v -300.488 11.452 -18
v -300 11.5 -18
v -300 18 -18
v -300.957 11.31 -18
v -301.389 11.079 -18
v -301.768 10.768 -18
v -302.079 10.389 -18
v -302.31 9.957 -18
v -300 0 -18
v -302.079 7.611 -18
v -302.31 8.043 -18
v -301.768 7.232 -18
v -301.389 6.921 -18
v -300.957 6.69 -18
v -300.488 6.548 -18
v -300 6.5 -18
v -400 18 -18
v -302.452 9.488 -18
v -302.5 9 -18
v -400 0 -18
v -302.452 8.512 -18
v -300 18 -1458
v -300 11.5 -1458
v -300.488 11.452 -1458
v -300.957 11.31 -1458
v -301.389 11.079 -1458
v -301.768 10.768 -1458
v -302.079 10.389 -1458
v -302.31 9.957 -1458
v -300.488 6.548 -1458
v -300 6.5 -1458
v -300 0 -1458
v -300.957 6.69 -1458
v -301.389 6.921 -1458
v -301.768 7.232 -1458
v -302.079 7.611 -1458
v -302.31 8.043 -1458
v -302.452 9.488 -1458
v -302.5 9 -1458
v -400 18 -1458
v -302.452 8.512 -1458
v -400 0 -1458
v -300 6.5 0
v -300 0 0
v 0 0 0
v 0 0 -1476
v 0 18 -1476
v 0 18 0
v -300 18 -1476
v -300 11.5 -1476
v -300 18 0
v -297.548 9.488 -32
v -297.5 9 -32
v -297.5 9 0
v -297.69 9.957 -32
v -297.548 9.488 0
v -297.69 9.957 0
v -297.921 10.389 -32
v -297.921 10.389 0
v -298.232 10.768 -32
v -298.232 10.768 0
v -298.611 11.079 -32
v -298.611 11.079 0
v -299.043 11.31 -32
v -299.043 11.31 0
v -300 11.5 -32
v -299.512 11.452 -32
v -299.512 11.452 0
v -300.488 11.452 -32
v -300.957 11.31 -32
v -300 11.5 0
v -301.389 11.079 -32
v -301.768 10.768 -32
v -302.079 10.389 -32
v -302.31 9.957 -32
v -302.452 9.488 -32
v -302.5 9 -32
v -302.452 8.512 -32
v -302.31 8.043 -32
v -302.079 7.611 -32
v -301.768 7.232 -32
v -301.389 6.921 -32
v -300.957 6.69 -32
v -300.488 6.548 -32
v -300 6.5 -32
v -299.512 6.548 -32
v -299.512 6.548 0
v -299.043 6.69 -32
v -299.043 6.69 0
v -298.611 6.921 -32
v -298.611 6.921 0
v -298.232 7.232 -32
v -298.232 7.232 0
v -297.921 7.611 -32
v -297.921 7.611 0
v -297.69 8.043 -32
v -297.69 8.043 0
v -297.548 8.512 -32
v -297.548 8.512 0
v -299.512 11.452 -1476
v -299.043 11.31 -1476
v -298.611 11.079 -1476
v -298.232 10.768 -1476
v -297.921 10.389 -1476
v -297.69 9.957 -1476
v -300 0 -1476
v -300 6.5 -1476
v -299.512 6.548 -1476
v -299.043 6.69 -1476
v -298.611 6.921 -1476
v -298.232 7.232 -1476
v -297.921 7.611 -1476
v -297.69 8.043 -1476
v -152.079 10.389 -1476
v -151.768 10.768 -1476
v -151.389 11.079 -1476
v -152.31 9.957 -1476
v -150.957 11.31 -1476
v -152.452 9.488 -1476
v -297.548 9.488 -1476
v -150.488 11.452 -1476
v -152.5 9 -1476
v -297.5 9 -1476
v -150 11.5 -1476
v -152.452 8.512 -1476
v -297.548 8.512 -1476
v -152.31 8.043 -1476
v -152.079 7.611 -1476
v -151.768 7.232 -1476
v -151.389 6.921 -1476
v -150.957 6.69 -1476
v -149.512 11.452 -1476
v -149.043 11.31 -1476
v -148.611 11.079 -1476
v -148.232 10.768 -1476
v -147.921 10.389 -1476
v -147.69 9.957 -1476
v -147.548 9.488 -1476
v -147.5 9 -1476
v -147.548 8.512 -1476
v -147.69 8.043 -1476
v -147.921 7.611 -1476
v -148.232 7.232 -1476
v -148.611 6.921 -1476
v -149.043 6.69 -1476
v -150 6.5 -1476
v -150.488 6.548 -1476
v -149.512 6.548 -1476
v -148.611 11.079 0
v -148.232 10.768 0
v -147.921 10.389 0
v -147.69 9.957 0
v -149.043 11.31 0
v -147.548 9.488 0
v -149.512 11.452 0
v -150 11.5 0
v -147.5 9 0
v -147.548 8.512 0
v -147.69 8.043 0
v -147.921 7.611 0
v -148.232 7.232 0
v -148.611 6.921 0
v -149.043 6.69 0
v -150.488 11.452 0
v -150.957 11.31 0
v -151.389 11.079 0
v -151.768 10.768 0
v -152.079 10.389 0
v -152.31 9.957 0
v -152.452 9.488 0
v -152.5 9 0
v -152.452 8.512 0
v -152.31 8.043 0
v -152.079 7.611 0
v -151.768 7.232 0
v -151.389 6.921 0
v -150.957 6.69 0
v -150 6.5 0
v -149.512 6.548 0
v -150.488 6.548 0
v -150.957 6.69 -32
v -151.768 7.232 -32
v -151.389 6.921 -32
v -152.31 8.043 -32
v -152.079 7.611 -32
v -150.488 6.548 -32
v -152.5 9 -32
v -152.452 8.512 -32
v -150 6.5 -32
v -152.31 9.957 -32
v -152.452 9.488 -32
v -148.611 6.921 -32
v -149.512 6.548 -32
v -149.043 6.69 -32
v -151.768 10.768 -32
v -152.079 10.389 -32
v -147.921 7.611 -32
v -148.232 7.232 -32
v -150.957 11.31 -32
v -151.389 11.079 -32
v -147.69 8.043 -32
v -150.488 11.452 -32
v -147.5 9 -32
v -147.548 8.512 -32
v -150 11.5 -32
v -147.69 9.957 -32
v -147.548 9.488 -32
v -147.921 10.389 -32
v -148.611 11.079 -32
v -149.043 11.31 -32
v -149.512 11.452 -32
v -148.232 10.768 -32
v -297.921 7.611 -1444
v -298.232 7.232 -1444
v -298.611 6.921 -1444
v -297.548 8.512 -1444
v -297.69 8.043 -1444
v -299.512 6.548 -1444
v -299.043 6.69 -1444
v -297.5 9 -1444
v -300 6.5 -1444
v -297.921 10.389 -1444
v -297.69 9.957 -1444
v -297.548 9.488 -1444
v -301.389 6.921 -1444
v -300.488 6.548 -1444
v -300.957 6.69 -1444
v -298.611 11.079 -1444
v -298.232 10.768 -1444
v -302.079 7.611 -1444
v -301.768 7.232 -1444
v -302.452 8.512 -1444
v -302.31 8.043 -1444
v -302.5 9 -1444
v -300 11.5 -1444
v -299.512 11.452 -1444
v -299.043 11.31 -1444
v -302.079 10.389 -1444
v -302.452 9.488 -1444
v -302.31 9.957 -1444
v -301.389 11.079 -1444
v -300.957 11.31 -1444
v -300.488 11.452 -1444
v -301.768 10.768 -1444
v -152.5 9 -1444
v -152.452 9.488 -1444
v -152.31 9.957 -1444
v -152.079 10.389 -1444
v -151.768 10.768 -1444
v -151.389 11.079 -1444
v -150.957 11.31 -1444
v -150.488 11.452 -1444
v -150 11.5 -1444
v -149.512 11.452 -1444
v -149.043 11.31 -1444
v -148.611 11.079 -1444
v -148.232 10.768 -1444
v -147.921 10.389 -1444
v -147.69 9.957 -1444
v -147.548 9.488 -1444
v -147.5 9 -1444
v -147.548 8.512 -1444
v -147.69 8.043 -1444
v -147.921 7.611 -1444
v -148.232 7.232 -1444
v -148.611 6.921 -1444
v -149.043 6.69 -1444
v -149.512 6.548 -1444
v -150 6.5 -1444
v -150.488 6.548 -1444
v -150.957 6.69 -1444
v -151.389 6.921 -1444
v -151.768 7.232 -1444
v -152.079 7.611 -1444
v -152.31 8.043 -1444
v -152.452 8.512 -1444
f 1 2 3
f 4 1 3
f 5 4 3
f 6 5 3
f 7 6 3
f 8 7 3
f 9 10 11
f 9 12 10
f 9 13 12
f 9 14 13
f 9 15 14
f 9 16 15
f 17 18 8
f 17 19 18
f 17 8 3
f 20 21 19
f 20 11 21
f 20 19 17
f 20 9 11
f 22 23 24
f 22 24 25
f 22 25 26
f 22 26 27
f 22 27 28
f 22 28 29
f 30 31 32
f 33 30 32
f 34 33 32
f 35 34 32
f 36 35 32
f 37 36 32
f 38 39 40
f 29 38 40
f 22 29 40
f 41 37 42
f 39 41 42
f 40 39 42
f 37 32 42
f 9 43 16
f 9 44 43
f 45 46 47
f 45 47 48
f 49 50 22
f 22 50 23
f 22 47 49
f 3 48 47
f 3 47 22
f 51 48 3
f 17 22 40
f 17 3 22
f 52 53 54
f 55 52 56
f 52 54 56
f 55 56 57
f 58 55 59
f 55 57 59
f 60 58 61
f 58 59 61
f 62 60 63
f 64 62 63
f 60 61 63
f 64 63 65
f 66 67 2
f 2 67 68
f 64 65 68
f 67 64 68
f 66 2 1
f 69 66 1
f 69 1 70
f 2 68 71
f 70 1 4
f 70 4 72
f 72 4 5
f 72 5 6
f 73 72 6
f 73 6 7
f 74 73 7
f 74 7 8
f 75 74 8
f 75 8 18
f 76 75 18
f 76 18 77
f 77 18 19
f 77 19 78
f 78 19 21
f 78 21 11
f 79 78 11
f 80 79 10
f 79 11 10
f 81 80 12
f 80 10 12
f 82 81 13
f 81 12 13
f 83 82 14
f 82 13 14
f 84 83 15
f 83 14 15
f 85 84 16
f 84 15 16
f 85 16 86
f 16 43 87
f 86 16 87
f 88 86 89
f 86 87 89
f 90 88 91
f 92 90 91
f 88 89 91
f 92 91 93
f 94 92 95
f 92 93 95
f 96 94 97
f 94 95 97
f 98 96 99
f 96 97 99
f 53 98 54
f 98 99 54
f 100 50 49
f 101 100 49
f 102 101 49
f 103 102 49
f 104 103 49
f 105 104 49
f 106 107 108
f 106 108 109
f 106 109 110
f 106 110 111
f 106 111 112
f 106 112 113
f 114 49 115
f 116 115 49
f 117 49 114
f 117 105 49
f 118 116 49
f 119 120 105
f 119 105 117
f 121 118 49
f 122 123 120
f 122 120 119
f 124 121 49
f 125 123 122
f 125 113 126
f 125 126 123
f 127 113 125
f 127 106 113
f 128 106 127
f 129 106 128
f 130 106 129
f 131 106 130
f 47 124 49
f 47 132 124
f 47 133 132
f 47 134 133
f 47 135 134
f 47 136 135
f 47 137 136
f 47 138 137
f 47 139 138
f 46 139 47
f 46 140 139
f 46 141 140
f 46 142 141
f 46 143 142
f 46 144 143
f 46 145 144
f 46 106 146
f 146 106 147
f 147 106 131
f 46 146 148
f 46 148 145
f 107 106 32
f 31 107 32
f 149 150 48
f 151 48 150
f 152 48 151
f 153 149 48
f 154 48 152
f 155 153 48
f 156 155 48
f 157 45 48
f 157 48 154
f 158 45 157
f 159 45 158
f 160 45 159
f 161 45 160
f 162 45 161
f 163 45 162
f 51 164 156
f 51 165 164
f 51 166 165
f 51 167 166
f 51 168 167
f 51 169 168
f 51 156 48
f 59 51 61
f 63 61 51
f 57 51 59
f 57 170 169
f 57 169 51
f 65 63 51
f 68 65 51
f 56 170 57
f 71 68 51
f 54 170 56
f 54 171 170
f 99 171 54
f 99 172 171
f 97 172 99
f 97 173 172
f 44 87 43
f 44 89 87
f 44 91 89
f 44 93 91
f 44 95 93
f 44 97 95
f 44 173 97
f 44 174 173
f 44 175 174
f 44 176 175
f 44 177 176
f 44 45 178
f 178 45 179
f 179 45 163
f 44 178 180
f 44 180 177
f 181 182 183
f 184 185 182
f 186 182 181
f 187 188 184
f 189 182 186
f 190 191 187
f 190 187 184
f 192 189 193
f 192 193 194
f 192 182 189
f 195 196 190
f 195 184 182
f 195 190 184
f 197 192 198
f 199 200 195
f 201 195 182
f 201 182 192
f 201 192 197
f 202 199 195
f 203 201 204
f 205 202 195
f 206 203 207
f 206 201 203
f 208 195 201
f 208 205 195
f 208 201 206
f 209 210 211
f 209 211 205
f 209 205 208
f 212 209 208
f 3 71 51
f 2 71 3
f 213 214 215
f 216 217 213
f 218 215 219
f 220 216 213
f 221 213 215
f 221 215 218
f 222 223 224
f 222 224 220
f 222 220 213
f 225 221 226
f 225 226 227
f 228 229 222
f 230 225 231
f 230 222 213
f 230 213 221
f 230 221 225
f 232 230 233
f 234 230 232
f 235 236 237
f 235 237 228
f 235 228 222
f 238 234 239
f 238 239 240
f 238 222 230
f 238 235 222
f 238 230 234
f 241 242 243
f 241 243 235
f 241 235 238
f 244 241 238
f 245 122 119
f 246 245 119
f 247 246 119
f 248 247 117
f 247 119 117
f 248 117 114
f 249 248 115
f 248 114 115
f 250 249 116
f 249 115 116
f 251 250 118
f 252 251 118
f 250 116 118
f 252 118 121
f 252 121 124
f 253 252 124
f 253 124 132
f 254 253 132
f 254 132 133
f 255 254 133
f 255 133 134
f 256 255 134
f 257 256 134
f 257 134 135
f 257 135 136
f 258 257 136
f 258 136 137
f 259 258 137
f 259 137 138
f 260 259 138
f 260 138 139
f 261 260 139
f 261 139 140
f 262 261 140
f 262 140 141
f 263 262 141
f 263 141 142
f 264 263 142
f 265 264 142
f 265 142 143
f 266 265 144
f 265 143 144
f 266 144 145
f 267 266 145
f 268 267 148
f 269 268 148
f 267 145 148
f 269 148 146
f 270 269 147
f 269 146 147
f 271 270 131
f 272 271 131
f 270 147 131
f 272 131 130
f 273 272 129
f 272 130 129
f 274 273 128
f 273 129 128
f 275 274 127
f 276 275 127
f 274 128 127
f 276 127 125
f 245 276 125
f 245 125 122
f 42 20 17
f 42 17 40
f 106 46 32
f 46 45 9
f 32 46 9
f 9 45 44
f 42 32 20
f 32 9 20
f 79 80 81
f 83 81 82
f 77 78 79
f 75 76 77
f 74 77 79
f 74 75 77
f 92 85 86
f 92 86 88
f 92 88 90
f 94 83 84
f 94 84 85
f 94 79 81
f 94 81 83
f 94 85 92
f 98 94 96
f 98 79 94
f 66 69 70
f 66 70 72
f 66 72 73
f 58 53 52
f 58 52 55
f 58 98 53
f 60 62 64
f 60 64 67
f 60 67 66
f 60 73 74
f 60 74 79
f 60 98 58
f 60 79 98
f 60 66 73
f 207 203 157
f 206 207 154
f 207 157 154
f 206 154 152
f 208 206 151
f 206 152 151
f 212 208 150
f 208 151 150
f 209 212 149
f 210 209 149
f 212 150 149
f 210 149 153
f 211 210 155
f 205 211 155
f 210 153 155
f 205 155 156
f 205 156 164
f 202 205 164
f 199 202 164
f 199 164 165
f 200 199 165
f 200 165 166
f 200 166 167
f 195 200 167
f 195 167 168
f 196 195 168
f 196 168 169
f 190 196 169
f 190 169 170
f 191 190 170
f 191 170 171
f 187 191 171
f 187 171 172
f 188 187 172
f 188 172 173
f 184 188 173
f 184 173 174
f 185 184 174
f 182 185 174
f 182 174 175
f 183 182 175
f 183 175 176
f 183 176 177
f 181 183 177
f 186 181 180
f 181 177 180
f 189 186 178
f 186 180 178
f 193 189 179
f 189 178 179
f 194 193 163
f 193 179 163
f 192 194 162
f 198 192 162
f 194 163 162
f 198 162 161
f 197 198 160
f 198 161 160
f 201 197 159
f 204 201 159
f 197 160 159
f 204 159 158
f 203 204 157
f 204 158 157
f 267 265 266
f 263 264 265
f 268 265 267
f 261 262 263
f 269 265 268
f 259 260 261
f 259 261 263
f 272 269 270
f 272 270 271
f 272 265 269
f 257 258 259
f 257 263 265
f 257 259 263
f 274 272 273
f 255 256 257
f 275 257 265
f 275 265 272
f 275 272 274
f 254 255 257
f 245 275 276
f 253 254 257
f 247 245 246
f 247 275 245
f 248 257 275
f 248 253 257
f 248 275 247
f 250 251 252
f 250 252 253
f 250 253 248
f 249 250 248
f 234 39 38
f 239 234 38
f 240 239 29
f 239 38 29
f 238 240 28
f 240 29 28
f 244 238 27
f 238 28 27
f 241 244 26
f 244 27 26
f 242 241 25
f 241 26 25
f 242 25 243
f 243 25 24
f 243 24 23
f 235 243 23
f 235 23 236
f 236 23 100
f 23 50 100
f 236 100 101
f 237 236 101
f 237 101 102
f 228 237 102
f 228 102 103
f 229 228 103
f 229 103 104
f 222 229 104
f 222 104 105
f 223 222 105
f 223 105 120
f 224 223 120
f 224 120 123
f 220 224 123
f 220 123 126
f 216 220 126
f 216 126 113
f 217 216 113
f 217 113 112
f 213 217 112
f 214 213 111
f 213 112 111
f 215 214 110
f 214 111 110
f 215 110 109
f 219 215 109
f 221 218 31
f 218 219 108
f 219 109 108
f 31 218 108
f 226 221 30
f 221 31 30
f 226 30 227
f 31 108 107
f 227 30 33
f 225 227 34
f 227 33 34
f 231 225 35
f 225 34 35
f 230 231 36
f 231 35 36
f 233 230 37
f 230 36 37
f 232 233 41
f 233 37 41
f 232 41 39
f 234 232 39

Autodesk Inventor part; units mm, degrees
ref_plane "YZ Plane" through (0, 0, 0) normal (1, 0, 0) x (0, 1, 0)
ref_plane "XZ Plane" through (0, 0, 0) normal (0, 1, 0) x (-1, 0, 0)
ref_plane "XY Plane" through (0, 0, 0) normal (0, 0, 1) x (1, 0, 0)
sketch "Sketch1" plane through (0, 0, 0) normal (0, 1, 0) x (-1, 0, 0)
  line L0 (0, 0) -> (400, 0)
  line L1 (400, 0) -> (400, -1476)
  line L2 (400, -1476) -> (0, -1476)
  line L3 (0, -1476) -> (0, 0)
  line L4 (400, -1476) -> (418, -1476)
  line L5 (400, -1476) -> (300, -1476)
  line L6 (300, -1476) -> (300, -1458)
  line L7 (300, -1458) -> (400, -1458)
  line L8 (400, -1458) -> (400, -1476)
  line L9 (400, 0) -> (300, 0)
  line L10 (300, 0) -> (300, -18)
  line L11 (300, -18) -> (400, -18)
  line L12 (400, -18) -> (400, 0)
  dimension "d0" = 400
  dimension "d1" = 1476
  dimension "d4" = 100
  dimension "d5" = 18
  dimension "d6" = 100
  dimension "d7" = 18
extrude "Extrusion1" add sketch "Sketch1" along normal blind 18 contours L0 L10 L11 L1 L7 L6 L2 L3
sketch "Sketch2" plane through (-300, 0, 0) normal (0, 0, 1) x (1, 0, 0)
  circle A0 centre (150, 9) radius 2.5
  circle A1 centre (0, 9) radius 2.5
  point P0 (300, 0)
  dimension "d13" = 5
  dimension "d14" = 5
sketch "Sketch3" plane through (0, 0, -1476) normal (0, 0, -1) x (-1, 0, 0)
  line L0 (300, 0) -> (300, 18) projected
  circle A0 centre (150, 9) radius 2.5
  circle A1 centre (300, 9) radius 2.5
  dimension "d18" = 5
  dimension "d19" = 5
extrude "Extrusion2" cut sketch "Sketch3" against normal blind 32
extrude "Extrusion3" cut sketch "Sketch2" against normal blind 32
properties part number "basedraws" material "MDF Medium Density Fiberboard"
